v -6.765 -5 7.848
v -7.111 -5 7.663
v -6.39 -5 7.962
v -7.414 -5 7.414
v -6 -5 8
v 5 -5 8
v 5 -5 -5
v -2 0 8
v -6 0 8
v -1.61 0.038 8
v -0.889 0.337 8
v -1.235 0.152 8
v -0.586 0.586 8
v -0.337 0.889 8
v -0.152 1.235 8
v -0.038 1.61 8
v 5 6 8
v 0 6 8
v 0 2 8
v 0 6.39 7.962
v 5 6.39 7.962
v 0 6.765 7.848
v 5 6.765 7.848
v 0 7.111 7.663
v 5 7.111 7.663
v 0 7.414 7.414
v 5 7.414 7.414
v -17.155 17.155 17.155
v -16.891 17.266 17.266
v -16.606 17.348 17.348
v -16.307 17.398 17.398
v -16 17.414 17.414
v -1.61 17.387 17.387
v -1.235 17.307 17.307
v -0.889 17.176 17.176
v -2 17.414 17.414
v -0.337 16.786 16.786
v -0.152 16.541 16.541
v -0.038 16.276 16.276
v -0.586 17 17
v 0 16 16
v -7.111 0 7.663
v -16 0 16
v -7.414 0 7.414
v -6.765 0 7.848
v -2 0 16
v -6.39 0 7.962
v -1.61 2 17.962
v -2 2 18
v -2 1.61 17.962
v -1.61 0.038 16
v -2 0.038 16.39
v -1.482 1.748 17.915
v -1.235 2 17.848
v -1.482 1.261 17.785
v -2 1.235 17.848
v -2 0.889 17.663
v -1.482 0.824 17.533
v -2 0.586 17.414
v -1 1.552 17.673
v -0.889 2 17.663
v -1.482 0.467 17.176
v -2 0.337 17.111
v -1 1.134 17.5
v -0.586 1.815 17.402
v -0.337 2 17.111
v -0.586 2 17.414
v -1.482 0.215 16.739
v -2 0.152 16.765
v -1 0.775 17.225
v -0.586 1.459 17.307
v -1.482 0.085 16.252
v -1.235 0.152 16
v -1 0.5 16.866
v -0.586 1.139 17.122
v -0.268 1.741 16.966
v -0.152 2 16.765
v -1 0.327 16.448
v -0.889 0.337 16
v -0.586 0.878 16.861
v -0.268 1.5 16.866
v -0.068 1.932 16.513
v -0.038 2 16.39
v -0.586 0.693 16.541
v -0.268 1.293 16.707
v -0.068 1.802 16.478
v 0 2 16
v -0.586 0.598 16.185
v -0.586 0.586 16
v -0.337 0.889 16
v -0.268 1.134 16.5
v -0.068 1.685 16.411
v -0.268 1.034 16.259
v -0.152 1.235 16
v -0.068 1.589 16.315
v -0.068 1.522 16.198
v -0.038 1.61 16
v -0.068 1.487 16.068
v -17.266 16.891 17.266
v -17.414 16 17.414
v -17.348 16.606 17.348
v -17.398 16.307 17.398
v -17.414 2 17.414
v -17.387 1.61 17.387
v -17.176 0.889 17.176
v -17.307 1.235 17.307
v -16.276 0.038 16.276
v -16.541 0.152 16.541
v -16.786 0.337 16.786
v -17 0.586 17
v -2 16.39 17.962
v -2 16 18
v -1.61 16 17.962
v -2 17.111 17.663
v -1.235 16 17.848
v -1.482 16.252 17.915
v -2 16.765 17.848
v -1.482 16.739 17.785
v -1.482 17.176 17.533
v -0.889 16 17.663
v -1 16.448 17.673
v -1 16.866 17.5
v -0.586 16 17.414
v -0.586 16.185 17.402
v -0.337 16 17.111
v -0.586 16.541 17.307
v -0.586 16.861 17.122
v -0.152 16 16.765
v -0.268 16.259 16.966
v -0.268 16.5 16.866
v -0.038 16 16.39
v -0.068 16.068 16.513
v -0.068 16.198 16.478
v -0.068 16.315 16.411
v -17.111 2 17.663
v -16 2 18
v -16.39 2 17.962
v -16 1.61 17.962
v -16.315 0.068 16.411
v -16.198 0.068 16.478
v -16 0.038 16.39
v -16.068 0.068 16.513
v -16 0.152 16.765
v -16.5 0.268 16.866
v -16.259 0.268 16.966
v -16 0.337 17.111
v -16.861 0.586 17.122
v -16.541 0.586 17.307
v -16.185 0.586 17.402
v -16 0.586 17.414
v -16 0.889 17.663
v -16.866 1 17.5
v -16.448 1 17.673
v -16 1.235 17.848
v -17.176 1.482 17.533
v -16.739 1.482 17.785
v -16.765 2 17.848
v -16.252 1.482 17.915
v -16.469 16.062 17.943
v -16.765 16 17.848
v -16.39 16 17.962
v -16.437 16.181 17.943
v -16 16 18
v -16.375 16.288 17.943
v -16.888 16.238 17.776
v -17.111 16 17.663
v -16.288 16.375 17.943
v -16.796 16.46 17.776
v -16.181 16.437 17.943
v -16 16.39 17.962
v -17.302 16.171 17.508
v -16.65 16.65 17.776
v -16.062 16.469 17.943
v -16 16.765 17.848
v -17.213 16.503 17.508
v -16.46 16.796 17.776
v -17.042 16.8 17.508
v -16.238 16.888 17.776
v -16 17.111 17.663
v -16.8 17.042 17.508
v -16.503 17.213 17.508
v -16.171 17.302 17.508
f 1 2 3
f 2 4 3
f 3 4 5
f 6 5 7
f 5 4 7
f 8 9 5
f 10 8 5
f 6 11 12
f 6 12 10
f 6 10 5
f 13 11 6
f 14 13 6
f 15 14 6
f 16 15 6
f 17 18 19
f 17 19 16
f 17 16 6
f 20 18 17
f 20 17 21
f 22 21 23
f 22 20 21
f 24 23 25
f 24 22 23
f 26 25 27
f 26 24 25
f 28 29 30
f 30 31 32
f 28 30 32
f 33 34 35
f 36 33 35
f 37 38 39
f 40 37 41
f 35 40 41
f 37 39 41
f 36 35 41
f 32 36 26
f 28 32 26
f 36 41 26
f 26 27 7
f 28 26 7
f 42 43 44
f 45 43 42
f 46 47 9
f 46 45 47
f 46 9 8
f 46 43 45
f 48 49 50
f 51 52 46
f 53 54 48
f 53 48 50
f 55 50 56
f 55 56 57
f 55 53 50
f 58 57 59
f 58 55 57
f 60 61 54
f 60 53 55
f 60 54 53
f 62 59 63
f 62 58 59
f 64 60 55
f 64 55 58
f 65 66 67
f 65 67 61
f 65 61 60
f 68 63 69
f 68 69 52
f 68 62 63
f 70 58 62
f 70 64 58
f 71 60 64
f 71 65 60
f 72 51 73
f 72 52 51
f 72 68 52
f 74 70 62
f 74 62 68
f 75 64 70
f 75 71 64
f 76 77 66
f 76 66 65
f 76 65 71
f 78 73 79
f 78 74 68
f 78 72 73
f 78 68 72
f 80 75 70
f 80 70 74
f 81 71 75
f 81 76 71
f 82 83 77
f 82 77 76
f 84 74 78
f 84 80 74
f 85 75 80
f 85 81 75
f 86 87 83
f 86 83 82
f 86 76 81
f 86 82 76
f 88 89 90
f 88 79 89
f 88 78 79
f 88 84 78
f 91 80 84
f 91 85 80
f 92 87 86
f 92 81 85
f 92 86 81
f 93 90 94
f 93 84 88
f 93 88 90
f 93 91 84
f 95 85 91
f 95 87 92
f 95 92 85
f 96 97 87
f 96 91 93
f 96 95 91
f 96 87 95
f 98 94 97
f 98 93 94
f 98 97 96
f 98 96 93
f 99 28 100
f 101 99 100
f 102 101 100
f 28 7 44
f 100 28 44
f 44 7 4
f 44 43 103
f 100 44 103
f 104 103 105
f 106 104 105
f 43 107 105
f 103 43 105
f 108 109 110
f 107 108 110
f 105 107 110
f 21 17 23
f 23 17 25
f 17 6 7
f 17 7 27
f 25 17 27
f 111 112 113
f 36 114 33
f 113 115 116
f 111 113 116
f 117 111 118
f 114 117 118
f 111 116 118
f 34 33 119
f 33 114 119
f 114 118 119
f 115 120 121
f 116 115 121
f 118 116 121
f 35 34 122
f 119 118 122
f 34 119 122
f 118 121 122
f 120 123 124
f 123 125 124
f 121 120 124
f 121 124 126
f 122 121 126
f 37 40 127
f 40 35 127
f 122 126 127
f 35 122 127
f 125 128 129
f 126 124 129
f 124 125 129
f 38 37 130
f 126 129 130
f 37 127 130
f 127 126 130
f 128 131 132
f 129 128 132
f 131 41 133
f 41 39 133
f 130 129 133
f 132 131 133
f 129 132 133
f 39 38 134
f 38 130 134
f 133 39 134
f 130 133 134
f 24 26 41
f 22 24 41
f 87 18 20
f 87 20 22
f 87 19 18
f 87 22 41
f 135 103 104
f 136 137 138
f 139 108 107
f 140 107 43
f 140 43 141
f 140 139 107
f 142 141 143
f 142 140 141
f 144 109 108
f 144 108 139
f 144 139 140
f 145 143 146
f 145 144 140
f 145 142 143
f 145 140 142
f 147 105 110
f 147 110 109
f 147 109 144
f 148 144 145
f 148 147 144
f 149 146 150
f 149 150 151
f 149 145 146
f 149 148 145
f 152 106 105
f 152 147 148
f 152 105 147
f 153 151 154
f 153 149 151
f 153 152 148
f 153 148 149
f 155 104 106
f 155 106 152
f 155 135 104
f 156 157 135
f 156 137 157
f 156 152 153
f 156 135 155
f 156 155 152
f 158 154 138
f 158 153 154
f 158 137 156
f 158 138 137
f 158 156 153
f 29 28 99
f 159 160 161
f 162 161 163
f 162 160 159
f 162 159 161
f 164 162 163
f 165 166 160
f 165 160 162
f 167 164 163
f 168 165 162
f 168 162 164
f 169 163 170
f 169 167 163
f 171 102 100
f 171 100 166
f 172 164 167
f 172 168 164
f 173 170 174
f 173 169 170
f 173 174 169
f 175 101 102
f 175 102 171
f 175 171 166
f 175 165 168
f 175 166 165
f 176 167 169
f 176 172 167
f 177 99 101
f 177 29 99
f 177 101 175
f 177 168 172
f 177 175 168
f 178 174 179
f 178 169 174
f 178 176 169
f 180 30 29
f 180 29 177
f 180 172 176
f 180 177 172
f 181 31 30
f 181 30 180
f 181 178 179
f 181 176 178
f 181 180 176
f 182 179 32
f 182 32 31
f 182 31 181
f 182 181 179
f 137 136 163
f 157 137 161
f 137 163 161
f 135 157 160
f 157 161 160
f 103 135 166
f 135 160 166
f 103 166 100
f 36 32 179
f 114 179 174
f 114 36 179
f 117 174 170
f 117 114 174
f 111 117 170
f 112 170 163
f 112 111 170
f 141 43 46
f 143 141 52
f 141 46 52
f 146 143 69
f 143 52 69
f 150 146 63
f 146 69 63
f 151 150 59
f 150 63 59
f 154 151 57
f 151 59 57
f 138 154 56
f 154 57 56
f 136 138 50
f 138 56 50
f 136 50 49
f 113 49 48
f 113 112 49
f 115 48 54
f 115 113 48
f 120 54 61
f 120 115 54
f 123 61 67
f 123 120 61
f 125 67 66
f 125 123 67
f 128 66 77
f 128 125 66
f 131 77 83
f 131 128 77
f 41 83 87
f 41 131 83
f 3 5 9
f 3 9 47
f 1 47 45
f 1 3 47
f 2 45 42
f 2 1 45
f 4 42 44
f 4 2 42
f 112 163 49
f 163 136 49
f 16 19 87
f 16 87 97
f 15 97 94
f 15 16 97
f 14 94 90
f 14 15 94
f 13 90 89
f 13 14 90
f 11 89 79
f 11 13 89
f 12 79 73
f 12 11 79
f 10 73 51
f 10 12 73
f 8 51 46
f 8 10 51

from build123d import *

# Parameters (mm, degrees)
F0_W         = 18
F0_H         = 18
F1_DEPTH     = 18
F2_W         = 10
F2_H         = 10
F2_W_2       = 3
F2_H_2       = 3
F3_DEPTH     = 5
F4_DEPTH     = 8
F5_R         = 2
F6_R         = 2
F7_T1_DEPTH  = 8
F7_T3_DEPTH  = 8
F7_T5_DEPTH  = 8
F7_S9_W      = 2
F7_S9_H      = 2
F7_T10_DEPTH = 2
F7_S15_W     = 2
F7_S15_H     = 2
F7_T16_DEPTH = 2
F7_S21_W     = 2
F7_S21_H     = 2
F7_T22_DEPTH = 2
F8_R         = 2
F10_DEPTH    = 20
F12_DEPTH    = 20


# Not quite as in the source:
# - a fillet or chamfer that OpenCascade refuses, or shapes differently, is made with other operations: its cross-section is extruded or revolved along the edge and cut away or added


with BuildPart() as f1:
    # F0 (on Front) → F1 (new body)
    with BuildSketch(Plane.XZ):
        with Locations((-9, 9)):
            Rectangle(F0_W, F0_H)
    extrude(amount=-F1_DEPTH)

    # F2 (on Top) → F3 (join)
    with BuildSketch(Plane.XY):
        Rectangle(F2_W, F2_H)
        with Locations((-6.5, 0)):
            Rectangle(F2_W_2, F2_H)
        with Locations((0, 6.5)):
            Rectangle(F2_W, F2_H_2)
        with Locations((-6.5, 6.5)):
            Rectangle(F2_W_2, F2_H_2)
    extrude(amount=-F3_DEPTH)

    # F2 (on Top) → F4 (join)
    with BuildSketch(Plane.XY):
        Rectangle(F2_W, F2_H)
        with Locations((-6.5, 0)):
            Rectangle(F2_W_2, F2_H)
        with Locations((0, 6.5)):
            Rectangle(F2_W, F2_H_2)
        with Locations((-6.5, 6.5)):
            Rectangle(F2_W_2, F2_H_2)
    extrude(amount=F4_DEPTH)

    # F5
    f5_edges = [f1.edges().sort_by_distance(p)[0] for p in [
        (-18, 18, 9),
        (-18, 9, 18),
        (-9, 18, 18),
    ]]
    fillet(f5_edges, radius=F5_R)

    # F6
    f6_edges = [f1.edges().sort_by_distance(p)[0] for p in [
        (0, 8, 18),
        (-8, 0, 18),
        (-18, 8, 0),
    ]]
    fillet(f6_edges, radius=F6_R)

    # F7: fillet of radius 2 on 3 edges, made by hand

    # F7_s2 → F7_t1 (cut)
    with BuildSketch(Plane.XZ.offset(-16)):
        with BuildLine():
            ThreePointArc((-2, 0), (-0.5857864376, 0.5857864376), (0, 2))
            Line((0, 2), (0, 0))
            Line((0, 0), (-2, 0))
        make_face()
    extrude(amount=F7_T1_DEPTH, mode=Mode.SUBTRACT)

    # F7_s4 → F7_t3 (cut)
    with BuildSketch(Plane.XY.offset(8)):
        with BuildLine():
            ThreePointArc((0, 2), (-0.5857864376, 0.5857864376), (-2, 0))
            Line((-2, 0), (0, 0))
            Line((0, 0), (0, 2))
        make_face()
    extrude(amount=F7_T3_DEPTH, mode=Mode.SUBTRACT)

    # F7_s6 → F7_t5 (cut)
    with BuildSketch(Plane.YZ.offset(-16)):
        with BuildLine():
            ThreePointArc((2, 0), (0.5857864376, 0.5857864376), (0, 2))
            Line((0, 2), (0, 0))
            Line((0, 0), (2, 0))
        make_face()
    extrude(amount=F7_T5_DEPTH, mode=Mode.SUBTRACT)


with BuildPart() as f7_tool8:
    # F7_s9 → F7_t10 (new body)
    with BuildSketch(Plane.XY.offset(2)):
        with Locations((-17, 1)):
            Rectangle(F7_S9_W, F7_S9_H)
    extrude(amount=-F7_T10_DEPTH)

    # F7_s11 → F7_t12 (revolve, cut)
    with BuildSketch(Plane(origin=(-16, 2, 2), x_dir=(0.7071067812, 0.7071067812, 0), z_dir=(-0.7071067812, 0.7071067812, 0))):
        with BuildLine():
            ThreePointArc((0, -2), (2, 0), (0, 2))
            Line((0, 2), (0, -2))
        make_face()
    revolve(axis=Axis((-16, 2, 2), (0, 0, -1)), mode=Mode.SUBTRACT)


with BuildPart() as f1_1:
    add(f1.part)

    # F7_t7: cut F7_tool8
    add(f7_tool8.part, mode=Mode.SUBTRACT)


with BuildPart() as f7_tool14:
    # F7_s15 → F7_t16 (new body)
    with BuildSketch(Plane.YZ.offset(-2)):
        with Locations((1, 17)):
            Rectangle(F7_S15_W, F7_S15_H)
    extrude(amount=F7_T16_DEPTH)

    # F7_s17 → F7_t18 (revolve, cut)
    with BuildSketch(Plane(origin=(-2, 2, 16), x_dir=(0, 0.7071067812, -0.7071067812), z_dir=(0, -0.7071067812, -0.7071067812))):
        with BuildLine():
            ThreePointArc((0, -2), (2, 0), (0, 2))
            Line((0, 2), (0, -2))
        make_face()
    revolve(axis=Axis((-2, 2, 16), (1, 0, 0)), mode=Mode.SUBTRACT)


with BuildPart() as f1_2:
    add(f1_1.part)

    # F7_t13: cut F7_tool14
    add(f7_tool14.part, mode=Mode.SUBTRACT)


with BuildPart() as f7_tool20:
    # F7_s21 → F7_t22 (new body)
    with BuildSketch(Plane.XY.offset(2)):
        with Locations((-1, 17)):
            Rectangle(F7_S21_W, F7_S21_H)
    extrude(amount=-F7_T22_DEPTH)

    # F7_s23 → F7_t24 (revolve, cut)
    with BuildSketch(Plane(origin=(-2, 16, 2), x_dir=(-0.7071067812, -0.7071067812, 0), z_dir=(0.7071067812, -0.7071067812, 0))):
        with BuildLine():
            ThreePointArc((0, -2), (2, 0), (0, 2))
            Line((0, 2), (0, -2))
        make_face()
    revolve(axis=Axis((-2, 16, 2), (0, 0, -1)), mode=Mode.SUBTRACT)


with BuildPart() as f1_3:
    add(f1_2.part)

    # F7_t19: cut F7_tool20
    add(f7_tool20.part, mode=Mode.SUBTRACT)

    # F8
    f8_edges = [f1_3.edges().sort_by_distance(p)[0] for p in [
        (-8, -2.5, 8),
        (2.5, 8, 8),
        (-8, 8, -2.5),
    ]]
    fillet(f8_edges, radius=F8_R)

    # F9 (on Front) → F10 (cut, symmetric)
    with BuildSketch(Plane.XZ):
        Polygon((5, -5), (-18, 18), (-18, -5), align=None)
    extrude(amount=F10_DEPTH, both=True, mode=Mode.SUBTRACT)

    # F11 (on Right) → F12 (cut, symmetric)
    with BuildSketch(Plane.YZ):
        Polygon((18, 18), (-5, -5), (18, -5), align=None)
    extrude(amount=F12_DEPTH, both=True, mode=Mode.SUBTRACT)


solid = f1_3.part
